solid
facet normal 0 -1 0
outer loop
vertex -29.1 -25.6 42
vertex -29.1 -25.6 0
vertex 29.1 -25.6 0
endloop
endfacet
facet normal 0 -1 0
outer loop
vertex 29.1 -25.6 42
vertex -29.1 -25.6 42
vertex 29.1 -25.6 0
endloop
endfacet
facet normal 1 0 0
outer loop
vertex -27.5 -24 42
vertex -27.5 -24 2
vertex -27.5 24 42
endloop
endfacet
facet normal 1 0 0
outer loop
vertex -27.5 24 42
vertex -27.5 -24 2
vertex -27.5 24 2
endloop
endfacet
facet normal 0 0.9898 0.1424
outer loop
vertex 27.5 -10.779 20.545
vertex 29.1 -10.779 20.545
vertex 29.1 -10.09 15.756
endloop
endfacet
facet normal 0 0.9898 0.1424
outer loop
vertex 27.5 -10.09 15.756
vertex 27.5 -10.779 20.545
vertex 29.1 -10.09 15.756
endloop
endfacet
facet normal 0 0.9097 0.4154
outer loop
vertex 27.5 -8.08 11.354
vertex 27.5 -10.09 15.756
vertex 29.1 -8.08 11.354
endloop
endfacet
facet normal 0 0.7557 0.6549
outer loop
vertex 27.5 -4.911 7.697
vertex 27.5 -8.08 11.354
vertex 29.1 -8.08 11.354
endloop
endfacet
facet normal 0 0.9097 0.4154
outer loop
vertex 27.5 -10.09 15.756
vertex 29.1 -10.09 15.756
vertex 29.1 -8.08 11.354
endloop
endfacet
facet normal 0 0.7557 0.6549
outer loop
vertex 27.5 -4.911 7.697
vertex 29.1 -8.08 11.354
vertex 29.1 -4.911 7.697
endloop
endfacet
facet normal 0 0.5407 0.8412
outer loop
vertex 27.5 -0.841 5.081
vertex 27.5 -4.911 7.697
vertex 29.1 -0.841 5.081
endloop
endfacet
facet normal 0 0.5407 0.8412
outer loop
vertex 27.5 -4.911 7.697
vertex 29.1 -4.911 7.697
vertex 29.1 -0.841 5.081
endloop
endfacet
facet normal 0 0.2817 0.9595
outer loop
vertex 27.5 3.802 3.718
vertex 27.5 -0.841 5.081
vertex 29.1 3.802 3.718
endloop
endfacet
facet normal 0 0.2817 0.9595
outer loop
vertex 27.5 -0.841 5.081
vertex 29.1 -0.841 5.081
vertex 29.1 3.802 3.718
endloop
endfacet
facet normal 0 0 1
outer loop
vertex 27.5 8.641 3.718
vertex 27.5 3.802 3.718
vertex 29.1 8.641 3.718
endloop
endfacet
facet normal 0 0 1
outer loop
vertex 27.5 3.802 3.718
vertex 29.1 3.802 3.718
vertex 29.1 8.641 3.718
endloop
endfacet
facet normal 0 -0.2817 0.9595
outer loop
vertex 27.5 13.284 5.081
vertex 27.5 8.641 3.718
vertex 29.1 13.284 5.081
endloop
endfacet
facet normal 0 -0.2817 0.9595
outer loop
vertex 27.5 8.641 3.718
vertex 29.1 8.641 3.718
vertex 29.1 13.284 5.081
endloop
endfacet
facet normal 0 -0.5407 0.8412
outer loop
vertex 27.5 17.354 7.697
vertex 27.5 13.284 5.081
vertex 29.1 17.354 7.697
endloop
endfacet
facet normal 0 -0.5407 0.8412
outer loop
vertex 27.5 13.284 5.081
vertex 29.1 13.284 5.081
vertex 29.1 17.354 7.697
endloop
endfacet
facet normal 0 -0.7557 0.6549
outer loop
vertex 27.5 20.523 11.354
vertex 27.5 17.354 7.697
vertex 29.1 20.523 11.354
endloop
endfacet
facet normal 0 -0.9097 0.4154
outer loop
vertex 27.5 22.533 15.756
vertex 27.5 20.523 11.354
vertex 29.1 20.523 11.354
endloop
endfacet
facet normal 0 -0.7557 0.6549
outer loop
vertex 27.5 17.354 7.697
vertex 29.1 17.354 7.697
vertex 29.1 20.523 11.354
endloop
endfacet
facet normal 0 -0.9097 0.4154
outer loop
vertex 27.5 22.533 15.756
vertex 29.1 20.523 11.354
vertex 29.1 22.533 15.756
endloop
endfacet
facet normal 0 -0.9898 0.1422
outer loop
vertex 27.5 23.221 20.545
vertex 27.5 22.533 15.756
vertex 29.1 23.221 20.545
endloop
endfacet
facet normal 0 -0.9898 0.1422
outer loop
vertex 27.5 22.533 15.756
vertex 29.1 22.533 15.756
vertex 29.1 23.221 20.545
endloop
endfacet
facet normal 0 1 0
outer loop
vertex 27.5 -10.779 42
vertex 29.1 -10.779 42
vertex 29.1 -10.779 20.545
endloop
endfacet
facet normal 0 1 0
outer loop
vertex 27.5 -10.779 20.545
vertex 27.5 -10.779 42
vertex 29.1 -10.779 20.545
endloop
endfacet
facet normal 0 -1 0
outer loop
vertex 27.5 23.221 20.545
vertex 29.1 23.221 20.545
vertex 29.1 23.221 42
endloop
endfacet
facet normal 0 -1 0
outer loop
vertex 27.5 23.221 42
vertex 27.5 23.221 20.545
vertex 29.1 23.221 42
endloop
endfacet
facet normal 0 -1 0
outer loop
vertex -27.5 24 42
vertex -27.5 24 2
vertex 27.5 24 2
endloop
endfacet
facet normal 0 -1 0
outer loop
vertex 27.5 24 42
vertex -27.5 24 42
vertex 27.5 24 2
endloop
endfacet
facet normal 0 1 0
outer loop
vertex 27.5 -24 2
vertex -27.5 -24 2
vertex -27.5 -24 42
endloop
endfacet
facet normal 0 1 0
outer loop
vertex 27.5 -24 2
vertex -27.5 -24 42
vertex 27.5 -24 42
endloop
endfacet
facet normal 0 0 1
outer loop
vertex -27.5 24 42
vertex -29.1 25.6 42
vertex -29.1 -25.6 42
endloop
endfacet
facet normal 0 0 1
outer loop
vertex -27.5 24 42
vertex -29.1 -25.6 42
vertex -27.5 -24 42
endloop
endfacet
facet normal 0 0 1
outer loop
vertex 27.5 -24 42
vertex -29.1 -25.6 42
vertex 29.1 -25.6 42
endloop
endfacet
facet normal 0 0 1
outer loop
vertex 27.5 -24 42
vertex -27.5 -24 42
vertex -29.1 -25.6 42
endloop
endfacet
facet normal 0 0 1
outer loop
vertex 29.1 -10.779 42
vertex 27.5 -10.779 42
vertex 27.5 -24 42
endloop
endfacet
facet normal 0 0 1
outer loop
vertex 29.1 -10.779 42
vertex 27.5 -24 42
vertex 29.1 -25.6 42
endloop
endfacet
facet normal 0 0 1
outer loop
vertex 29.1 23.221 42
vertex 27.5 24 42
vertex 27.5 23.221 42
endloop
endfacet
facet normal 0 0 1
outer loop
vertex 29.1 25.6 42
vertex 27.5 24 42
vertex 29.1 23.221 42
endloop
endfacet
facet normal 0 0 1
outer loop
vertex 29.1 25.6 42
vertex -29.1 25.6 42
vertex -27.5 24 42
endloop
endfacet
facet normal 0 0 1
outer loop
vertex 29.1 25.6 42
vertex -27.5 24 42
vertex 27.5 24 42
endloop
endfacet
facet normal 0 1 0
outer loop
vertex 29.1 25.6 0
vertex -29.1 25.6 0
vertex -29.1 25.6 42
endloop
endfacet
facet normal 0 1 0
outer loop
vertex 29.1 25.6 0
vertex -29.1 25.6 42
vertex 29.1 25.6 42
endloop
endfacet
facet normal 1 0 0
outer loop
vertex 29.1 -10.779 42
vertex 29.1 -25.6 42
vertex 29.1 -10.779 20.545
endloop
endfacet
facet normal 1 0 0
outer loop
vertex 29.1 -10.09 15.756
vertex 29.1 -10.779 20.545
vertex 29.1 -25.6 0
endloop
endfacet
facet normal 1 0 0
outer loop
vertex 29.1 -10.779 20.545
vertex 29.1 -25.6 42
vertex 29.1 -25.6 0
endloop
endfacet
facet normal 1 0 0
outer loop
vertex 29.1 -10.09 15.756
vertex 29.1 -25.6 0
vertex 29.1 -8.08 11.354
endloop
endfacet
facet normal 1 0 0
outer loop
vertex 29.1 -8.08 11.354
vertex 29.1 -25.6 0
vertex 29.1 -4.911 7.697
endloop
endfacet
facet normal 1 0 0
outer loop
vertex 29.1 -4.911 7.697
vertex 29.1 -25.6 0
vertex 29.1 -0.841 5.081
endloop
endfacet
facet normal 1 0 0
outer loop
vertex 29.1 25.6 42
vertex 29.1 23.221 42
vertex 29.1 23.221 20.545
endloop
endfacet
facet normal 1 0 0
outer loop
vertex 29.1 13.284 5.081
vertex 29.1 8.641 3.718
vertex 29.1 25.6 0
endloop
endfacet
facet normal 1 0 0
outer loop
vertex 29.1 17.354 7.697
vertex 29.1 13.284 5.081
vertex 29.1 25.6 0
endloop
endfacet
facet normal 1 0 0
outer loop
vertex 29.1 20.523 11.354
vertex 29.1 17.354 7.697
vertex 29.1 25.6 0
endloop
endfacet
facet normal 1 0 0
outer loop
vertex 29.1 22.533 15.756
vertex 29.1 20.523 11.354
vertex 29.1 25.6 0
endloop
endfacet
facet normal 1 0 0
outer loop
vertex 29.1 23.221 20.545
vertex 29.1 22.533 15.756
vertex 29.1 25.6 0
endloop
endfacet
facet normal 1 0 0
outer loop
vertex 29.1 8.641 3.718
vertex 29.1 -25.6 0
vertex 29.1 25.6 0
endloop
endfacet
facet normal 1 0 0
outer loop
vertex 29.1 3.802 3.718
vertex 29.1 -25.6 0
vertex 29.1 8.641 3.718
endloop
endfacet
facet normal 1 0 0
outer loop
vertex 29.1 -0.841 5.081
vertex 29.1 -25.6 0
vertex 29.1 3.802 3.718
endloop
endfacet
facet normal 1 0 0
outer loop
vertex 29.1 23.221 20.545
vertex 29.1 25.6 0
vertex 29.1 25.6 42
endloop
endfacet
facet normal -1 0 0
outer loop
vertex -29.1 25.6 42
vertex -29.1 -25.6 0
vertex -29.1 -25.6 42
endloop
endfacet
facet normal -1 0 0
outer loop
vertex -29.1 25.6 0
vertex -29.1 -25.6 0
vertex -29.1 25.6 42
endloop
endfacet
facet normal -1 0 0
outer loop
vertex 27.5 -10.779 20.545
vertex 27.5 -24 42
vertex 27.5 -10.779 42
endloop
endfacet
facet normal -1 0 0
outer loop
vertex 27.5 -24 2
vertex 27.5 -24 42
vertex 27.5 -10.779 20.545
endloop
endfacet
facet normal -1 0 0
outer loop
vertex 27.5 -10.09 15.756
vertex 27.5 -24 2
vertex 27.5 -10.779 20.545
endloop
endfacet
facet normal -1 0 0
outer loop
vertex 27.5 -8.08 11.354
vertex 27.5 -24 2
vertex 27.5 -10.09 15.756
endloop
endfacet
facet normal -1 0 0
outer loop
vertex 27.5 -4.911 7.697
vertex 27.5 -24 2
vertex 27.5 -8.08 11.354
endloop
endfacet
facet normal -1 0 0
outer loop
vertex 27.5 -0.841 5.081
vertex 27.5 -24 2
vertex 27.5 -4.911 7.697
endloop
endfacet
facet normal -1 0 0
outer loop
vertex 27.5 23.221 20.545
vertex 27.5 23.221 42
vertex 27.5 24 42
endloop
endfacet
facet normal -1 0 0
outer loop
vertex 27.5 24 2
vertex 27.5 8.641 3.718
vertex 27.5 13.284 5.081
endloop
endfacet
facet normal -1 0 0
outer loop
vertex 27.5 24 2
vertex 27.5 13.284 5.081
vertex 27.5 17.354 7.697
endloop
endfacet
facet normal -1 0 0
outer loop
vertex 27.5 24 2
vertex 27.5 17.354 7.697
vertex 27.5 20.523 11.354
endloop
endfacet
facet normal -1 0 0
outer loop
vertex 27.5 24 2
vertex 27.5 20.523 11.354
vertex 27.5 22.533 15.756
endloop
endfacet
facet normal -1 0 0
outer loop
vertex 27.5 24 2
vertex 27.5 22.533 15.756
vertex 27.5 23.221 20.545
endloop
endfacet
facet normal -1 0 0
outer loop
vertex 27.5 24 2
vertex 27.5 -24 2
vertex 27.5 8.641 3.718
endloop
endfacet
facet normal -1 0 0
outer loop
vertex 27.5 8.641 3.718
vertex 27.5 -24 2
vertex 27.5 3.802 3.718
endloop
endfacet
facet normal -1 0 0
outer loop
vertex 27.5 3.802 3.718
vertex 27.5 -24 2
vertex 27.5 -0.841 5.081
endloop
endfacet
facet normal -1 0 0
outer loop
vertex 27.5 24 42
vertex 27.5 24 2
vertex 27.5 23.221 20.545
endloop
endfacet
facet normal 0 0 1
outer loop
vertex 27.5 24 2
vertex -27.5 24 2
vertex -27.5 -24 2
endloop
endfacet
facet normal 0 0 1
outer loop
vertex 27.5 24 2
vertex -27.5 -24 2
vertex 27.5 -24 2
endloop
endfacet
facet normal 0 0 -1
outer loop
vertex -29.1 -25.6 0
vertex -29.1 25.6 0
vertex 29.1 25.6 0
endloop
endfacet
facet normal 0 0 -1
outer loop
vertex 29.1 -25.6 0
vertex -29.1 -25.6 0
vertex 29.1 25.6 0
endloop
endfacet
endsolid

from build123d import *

# Parameters (mm, degrees)
F0_W     = 55
F0_H     = 48
F1_DEPTH = 2
F0_W_2   = 58.2
F0_H_2   = 51.2
F2_DEPTH = 42
F4_DEPTH = 4


with BuildPart() as f1:
    # F0 (on Top) → F1 (new body)
    with BuildSketch(Plane.XY):
        Rectangle(F0_W, F0_H)
    extrude(amount=F1_DEPTH)

    # F0 (on Top) → F2 (join)
    with BuildSketch(Plane.XY):
        Rectangle(F0_W_2, F0_H_2)
        Rectangle(F0_W, F0_H, mode=Mode.SUBTRACT)
    extrude(amount=F2_DEPTH)

    # F3 (on face) → F4 (cut)
    with BuildSketch(Plane.YZ.offset(29.1)):
        with BuildLine():
            ThreePointArc((-10.778551, 20.545242), (6.221449, 37.545242), (23.221449, 20.545242))
            Line((23.221449, 20.545242), (23.221449, 42))
            Line((23.221449, 42), (-10.778551, 42))
            Line((-10.778551, 42), (-10.778551, 20.545242))
        make_face()
        with BuildLine():
            ThreePointArc((-10.778551, 20.545242), (6.221449, 3.545242), (23.221449, 20.545242))
            ThreePointArc((23.221449, 20.545242), (6.221449, 37.545242), (-10.778551, 20.545242))
        make_face()
    extrude(amount=-F4_DEPTH, mode=Mode.SUBTRACT)


solid = f1.part
